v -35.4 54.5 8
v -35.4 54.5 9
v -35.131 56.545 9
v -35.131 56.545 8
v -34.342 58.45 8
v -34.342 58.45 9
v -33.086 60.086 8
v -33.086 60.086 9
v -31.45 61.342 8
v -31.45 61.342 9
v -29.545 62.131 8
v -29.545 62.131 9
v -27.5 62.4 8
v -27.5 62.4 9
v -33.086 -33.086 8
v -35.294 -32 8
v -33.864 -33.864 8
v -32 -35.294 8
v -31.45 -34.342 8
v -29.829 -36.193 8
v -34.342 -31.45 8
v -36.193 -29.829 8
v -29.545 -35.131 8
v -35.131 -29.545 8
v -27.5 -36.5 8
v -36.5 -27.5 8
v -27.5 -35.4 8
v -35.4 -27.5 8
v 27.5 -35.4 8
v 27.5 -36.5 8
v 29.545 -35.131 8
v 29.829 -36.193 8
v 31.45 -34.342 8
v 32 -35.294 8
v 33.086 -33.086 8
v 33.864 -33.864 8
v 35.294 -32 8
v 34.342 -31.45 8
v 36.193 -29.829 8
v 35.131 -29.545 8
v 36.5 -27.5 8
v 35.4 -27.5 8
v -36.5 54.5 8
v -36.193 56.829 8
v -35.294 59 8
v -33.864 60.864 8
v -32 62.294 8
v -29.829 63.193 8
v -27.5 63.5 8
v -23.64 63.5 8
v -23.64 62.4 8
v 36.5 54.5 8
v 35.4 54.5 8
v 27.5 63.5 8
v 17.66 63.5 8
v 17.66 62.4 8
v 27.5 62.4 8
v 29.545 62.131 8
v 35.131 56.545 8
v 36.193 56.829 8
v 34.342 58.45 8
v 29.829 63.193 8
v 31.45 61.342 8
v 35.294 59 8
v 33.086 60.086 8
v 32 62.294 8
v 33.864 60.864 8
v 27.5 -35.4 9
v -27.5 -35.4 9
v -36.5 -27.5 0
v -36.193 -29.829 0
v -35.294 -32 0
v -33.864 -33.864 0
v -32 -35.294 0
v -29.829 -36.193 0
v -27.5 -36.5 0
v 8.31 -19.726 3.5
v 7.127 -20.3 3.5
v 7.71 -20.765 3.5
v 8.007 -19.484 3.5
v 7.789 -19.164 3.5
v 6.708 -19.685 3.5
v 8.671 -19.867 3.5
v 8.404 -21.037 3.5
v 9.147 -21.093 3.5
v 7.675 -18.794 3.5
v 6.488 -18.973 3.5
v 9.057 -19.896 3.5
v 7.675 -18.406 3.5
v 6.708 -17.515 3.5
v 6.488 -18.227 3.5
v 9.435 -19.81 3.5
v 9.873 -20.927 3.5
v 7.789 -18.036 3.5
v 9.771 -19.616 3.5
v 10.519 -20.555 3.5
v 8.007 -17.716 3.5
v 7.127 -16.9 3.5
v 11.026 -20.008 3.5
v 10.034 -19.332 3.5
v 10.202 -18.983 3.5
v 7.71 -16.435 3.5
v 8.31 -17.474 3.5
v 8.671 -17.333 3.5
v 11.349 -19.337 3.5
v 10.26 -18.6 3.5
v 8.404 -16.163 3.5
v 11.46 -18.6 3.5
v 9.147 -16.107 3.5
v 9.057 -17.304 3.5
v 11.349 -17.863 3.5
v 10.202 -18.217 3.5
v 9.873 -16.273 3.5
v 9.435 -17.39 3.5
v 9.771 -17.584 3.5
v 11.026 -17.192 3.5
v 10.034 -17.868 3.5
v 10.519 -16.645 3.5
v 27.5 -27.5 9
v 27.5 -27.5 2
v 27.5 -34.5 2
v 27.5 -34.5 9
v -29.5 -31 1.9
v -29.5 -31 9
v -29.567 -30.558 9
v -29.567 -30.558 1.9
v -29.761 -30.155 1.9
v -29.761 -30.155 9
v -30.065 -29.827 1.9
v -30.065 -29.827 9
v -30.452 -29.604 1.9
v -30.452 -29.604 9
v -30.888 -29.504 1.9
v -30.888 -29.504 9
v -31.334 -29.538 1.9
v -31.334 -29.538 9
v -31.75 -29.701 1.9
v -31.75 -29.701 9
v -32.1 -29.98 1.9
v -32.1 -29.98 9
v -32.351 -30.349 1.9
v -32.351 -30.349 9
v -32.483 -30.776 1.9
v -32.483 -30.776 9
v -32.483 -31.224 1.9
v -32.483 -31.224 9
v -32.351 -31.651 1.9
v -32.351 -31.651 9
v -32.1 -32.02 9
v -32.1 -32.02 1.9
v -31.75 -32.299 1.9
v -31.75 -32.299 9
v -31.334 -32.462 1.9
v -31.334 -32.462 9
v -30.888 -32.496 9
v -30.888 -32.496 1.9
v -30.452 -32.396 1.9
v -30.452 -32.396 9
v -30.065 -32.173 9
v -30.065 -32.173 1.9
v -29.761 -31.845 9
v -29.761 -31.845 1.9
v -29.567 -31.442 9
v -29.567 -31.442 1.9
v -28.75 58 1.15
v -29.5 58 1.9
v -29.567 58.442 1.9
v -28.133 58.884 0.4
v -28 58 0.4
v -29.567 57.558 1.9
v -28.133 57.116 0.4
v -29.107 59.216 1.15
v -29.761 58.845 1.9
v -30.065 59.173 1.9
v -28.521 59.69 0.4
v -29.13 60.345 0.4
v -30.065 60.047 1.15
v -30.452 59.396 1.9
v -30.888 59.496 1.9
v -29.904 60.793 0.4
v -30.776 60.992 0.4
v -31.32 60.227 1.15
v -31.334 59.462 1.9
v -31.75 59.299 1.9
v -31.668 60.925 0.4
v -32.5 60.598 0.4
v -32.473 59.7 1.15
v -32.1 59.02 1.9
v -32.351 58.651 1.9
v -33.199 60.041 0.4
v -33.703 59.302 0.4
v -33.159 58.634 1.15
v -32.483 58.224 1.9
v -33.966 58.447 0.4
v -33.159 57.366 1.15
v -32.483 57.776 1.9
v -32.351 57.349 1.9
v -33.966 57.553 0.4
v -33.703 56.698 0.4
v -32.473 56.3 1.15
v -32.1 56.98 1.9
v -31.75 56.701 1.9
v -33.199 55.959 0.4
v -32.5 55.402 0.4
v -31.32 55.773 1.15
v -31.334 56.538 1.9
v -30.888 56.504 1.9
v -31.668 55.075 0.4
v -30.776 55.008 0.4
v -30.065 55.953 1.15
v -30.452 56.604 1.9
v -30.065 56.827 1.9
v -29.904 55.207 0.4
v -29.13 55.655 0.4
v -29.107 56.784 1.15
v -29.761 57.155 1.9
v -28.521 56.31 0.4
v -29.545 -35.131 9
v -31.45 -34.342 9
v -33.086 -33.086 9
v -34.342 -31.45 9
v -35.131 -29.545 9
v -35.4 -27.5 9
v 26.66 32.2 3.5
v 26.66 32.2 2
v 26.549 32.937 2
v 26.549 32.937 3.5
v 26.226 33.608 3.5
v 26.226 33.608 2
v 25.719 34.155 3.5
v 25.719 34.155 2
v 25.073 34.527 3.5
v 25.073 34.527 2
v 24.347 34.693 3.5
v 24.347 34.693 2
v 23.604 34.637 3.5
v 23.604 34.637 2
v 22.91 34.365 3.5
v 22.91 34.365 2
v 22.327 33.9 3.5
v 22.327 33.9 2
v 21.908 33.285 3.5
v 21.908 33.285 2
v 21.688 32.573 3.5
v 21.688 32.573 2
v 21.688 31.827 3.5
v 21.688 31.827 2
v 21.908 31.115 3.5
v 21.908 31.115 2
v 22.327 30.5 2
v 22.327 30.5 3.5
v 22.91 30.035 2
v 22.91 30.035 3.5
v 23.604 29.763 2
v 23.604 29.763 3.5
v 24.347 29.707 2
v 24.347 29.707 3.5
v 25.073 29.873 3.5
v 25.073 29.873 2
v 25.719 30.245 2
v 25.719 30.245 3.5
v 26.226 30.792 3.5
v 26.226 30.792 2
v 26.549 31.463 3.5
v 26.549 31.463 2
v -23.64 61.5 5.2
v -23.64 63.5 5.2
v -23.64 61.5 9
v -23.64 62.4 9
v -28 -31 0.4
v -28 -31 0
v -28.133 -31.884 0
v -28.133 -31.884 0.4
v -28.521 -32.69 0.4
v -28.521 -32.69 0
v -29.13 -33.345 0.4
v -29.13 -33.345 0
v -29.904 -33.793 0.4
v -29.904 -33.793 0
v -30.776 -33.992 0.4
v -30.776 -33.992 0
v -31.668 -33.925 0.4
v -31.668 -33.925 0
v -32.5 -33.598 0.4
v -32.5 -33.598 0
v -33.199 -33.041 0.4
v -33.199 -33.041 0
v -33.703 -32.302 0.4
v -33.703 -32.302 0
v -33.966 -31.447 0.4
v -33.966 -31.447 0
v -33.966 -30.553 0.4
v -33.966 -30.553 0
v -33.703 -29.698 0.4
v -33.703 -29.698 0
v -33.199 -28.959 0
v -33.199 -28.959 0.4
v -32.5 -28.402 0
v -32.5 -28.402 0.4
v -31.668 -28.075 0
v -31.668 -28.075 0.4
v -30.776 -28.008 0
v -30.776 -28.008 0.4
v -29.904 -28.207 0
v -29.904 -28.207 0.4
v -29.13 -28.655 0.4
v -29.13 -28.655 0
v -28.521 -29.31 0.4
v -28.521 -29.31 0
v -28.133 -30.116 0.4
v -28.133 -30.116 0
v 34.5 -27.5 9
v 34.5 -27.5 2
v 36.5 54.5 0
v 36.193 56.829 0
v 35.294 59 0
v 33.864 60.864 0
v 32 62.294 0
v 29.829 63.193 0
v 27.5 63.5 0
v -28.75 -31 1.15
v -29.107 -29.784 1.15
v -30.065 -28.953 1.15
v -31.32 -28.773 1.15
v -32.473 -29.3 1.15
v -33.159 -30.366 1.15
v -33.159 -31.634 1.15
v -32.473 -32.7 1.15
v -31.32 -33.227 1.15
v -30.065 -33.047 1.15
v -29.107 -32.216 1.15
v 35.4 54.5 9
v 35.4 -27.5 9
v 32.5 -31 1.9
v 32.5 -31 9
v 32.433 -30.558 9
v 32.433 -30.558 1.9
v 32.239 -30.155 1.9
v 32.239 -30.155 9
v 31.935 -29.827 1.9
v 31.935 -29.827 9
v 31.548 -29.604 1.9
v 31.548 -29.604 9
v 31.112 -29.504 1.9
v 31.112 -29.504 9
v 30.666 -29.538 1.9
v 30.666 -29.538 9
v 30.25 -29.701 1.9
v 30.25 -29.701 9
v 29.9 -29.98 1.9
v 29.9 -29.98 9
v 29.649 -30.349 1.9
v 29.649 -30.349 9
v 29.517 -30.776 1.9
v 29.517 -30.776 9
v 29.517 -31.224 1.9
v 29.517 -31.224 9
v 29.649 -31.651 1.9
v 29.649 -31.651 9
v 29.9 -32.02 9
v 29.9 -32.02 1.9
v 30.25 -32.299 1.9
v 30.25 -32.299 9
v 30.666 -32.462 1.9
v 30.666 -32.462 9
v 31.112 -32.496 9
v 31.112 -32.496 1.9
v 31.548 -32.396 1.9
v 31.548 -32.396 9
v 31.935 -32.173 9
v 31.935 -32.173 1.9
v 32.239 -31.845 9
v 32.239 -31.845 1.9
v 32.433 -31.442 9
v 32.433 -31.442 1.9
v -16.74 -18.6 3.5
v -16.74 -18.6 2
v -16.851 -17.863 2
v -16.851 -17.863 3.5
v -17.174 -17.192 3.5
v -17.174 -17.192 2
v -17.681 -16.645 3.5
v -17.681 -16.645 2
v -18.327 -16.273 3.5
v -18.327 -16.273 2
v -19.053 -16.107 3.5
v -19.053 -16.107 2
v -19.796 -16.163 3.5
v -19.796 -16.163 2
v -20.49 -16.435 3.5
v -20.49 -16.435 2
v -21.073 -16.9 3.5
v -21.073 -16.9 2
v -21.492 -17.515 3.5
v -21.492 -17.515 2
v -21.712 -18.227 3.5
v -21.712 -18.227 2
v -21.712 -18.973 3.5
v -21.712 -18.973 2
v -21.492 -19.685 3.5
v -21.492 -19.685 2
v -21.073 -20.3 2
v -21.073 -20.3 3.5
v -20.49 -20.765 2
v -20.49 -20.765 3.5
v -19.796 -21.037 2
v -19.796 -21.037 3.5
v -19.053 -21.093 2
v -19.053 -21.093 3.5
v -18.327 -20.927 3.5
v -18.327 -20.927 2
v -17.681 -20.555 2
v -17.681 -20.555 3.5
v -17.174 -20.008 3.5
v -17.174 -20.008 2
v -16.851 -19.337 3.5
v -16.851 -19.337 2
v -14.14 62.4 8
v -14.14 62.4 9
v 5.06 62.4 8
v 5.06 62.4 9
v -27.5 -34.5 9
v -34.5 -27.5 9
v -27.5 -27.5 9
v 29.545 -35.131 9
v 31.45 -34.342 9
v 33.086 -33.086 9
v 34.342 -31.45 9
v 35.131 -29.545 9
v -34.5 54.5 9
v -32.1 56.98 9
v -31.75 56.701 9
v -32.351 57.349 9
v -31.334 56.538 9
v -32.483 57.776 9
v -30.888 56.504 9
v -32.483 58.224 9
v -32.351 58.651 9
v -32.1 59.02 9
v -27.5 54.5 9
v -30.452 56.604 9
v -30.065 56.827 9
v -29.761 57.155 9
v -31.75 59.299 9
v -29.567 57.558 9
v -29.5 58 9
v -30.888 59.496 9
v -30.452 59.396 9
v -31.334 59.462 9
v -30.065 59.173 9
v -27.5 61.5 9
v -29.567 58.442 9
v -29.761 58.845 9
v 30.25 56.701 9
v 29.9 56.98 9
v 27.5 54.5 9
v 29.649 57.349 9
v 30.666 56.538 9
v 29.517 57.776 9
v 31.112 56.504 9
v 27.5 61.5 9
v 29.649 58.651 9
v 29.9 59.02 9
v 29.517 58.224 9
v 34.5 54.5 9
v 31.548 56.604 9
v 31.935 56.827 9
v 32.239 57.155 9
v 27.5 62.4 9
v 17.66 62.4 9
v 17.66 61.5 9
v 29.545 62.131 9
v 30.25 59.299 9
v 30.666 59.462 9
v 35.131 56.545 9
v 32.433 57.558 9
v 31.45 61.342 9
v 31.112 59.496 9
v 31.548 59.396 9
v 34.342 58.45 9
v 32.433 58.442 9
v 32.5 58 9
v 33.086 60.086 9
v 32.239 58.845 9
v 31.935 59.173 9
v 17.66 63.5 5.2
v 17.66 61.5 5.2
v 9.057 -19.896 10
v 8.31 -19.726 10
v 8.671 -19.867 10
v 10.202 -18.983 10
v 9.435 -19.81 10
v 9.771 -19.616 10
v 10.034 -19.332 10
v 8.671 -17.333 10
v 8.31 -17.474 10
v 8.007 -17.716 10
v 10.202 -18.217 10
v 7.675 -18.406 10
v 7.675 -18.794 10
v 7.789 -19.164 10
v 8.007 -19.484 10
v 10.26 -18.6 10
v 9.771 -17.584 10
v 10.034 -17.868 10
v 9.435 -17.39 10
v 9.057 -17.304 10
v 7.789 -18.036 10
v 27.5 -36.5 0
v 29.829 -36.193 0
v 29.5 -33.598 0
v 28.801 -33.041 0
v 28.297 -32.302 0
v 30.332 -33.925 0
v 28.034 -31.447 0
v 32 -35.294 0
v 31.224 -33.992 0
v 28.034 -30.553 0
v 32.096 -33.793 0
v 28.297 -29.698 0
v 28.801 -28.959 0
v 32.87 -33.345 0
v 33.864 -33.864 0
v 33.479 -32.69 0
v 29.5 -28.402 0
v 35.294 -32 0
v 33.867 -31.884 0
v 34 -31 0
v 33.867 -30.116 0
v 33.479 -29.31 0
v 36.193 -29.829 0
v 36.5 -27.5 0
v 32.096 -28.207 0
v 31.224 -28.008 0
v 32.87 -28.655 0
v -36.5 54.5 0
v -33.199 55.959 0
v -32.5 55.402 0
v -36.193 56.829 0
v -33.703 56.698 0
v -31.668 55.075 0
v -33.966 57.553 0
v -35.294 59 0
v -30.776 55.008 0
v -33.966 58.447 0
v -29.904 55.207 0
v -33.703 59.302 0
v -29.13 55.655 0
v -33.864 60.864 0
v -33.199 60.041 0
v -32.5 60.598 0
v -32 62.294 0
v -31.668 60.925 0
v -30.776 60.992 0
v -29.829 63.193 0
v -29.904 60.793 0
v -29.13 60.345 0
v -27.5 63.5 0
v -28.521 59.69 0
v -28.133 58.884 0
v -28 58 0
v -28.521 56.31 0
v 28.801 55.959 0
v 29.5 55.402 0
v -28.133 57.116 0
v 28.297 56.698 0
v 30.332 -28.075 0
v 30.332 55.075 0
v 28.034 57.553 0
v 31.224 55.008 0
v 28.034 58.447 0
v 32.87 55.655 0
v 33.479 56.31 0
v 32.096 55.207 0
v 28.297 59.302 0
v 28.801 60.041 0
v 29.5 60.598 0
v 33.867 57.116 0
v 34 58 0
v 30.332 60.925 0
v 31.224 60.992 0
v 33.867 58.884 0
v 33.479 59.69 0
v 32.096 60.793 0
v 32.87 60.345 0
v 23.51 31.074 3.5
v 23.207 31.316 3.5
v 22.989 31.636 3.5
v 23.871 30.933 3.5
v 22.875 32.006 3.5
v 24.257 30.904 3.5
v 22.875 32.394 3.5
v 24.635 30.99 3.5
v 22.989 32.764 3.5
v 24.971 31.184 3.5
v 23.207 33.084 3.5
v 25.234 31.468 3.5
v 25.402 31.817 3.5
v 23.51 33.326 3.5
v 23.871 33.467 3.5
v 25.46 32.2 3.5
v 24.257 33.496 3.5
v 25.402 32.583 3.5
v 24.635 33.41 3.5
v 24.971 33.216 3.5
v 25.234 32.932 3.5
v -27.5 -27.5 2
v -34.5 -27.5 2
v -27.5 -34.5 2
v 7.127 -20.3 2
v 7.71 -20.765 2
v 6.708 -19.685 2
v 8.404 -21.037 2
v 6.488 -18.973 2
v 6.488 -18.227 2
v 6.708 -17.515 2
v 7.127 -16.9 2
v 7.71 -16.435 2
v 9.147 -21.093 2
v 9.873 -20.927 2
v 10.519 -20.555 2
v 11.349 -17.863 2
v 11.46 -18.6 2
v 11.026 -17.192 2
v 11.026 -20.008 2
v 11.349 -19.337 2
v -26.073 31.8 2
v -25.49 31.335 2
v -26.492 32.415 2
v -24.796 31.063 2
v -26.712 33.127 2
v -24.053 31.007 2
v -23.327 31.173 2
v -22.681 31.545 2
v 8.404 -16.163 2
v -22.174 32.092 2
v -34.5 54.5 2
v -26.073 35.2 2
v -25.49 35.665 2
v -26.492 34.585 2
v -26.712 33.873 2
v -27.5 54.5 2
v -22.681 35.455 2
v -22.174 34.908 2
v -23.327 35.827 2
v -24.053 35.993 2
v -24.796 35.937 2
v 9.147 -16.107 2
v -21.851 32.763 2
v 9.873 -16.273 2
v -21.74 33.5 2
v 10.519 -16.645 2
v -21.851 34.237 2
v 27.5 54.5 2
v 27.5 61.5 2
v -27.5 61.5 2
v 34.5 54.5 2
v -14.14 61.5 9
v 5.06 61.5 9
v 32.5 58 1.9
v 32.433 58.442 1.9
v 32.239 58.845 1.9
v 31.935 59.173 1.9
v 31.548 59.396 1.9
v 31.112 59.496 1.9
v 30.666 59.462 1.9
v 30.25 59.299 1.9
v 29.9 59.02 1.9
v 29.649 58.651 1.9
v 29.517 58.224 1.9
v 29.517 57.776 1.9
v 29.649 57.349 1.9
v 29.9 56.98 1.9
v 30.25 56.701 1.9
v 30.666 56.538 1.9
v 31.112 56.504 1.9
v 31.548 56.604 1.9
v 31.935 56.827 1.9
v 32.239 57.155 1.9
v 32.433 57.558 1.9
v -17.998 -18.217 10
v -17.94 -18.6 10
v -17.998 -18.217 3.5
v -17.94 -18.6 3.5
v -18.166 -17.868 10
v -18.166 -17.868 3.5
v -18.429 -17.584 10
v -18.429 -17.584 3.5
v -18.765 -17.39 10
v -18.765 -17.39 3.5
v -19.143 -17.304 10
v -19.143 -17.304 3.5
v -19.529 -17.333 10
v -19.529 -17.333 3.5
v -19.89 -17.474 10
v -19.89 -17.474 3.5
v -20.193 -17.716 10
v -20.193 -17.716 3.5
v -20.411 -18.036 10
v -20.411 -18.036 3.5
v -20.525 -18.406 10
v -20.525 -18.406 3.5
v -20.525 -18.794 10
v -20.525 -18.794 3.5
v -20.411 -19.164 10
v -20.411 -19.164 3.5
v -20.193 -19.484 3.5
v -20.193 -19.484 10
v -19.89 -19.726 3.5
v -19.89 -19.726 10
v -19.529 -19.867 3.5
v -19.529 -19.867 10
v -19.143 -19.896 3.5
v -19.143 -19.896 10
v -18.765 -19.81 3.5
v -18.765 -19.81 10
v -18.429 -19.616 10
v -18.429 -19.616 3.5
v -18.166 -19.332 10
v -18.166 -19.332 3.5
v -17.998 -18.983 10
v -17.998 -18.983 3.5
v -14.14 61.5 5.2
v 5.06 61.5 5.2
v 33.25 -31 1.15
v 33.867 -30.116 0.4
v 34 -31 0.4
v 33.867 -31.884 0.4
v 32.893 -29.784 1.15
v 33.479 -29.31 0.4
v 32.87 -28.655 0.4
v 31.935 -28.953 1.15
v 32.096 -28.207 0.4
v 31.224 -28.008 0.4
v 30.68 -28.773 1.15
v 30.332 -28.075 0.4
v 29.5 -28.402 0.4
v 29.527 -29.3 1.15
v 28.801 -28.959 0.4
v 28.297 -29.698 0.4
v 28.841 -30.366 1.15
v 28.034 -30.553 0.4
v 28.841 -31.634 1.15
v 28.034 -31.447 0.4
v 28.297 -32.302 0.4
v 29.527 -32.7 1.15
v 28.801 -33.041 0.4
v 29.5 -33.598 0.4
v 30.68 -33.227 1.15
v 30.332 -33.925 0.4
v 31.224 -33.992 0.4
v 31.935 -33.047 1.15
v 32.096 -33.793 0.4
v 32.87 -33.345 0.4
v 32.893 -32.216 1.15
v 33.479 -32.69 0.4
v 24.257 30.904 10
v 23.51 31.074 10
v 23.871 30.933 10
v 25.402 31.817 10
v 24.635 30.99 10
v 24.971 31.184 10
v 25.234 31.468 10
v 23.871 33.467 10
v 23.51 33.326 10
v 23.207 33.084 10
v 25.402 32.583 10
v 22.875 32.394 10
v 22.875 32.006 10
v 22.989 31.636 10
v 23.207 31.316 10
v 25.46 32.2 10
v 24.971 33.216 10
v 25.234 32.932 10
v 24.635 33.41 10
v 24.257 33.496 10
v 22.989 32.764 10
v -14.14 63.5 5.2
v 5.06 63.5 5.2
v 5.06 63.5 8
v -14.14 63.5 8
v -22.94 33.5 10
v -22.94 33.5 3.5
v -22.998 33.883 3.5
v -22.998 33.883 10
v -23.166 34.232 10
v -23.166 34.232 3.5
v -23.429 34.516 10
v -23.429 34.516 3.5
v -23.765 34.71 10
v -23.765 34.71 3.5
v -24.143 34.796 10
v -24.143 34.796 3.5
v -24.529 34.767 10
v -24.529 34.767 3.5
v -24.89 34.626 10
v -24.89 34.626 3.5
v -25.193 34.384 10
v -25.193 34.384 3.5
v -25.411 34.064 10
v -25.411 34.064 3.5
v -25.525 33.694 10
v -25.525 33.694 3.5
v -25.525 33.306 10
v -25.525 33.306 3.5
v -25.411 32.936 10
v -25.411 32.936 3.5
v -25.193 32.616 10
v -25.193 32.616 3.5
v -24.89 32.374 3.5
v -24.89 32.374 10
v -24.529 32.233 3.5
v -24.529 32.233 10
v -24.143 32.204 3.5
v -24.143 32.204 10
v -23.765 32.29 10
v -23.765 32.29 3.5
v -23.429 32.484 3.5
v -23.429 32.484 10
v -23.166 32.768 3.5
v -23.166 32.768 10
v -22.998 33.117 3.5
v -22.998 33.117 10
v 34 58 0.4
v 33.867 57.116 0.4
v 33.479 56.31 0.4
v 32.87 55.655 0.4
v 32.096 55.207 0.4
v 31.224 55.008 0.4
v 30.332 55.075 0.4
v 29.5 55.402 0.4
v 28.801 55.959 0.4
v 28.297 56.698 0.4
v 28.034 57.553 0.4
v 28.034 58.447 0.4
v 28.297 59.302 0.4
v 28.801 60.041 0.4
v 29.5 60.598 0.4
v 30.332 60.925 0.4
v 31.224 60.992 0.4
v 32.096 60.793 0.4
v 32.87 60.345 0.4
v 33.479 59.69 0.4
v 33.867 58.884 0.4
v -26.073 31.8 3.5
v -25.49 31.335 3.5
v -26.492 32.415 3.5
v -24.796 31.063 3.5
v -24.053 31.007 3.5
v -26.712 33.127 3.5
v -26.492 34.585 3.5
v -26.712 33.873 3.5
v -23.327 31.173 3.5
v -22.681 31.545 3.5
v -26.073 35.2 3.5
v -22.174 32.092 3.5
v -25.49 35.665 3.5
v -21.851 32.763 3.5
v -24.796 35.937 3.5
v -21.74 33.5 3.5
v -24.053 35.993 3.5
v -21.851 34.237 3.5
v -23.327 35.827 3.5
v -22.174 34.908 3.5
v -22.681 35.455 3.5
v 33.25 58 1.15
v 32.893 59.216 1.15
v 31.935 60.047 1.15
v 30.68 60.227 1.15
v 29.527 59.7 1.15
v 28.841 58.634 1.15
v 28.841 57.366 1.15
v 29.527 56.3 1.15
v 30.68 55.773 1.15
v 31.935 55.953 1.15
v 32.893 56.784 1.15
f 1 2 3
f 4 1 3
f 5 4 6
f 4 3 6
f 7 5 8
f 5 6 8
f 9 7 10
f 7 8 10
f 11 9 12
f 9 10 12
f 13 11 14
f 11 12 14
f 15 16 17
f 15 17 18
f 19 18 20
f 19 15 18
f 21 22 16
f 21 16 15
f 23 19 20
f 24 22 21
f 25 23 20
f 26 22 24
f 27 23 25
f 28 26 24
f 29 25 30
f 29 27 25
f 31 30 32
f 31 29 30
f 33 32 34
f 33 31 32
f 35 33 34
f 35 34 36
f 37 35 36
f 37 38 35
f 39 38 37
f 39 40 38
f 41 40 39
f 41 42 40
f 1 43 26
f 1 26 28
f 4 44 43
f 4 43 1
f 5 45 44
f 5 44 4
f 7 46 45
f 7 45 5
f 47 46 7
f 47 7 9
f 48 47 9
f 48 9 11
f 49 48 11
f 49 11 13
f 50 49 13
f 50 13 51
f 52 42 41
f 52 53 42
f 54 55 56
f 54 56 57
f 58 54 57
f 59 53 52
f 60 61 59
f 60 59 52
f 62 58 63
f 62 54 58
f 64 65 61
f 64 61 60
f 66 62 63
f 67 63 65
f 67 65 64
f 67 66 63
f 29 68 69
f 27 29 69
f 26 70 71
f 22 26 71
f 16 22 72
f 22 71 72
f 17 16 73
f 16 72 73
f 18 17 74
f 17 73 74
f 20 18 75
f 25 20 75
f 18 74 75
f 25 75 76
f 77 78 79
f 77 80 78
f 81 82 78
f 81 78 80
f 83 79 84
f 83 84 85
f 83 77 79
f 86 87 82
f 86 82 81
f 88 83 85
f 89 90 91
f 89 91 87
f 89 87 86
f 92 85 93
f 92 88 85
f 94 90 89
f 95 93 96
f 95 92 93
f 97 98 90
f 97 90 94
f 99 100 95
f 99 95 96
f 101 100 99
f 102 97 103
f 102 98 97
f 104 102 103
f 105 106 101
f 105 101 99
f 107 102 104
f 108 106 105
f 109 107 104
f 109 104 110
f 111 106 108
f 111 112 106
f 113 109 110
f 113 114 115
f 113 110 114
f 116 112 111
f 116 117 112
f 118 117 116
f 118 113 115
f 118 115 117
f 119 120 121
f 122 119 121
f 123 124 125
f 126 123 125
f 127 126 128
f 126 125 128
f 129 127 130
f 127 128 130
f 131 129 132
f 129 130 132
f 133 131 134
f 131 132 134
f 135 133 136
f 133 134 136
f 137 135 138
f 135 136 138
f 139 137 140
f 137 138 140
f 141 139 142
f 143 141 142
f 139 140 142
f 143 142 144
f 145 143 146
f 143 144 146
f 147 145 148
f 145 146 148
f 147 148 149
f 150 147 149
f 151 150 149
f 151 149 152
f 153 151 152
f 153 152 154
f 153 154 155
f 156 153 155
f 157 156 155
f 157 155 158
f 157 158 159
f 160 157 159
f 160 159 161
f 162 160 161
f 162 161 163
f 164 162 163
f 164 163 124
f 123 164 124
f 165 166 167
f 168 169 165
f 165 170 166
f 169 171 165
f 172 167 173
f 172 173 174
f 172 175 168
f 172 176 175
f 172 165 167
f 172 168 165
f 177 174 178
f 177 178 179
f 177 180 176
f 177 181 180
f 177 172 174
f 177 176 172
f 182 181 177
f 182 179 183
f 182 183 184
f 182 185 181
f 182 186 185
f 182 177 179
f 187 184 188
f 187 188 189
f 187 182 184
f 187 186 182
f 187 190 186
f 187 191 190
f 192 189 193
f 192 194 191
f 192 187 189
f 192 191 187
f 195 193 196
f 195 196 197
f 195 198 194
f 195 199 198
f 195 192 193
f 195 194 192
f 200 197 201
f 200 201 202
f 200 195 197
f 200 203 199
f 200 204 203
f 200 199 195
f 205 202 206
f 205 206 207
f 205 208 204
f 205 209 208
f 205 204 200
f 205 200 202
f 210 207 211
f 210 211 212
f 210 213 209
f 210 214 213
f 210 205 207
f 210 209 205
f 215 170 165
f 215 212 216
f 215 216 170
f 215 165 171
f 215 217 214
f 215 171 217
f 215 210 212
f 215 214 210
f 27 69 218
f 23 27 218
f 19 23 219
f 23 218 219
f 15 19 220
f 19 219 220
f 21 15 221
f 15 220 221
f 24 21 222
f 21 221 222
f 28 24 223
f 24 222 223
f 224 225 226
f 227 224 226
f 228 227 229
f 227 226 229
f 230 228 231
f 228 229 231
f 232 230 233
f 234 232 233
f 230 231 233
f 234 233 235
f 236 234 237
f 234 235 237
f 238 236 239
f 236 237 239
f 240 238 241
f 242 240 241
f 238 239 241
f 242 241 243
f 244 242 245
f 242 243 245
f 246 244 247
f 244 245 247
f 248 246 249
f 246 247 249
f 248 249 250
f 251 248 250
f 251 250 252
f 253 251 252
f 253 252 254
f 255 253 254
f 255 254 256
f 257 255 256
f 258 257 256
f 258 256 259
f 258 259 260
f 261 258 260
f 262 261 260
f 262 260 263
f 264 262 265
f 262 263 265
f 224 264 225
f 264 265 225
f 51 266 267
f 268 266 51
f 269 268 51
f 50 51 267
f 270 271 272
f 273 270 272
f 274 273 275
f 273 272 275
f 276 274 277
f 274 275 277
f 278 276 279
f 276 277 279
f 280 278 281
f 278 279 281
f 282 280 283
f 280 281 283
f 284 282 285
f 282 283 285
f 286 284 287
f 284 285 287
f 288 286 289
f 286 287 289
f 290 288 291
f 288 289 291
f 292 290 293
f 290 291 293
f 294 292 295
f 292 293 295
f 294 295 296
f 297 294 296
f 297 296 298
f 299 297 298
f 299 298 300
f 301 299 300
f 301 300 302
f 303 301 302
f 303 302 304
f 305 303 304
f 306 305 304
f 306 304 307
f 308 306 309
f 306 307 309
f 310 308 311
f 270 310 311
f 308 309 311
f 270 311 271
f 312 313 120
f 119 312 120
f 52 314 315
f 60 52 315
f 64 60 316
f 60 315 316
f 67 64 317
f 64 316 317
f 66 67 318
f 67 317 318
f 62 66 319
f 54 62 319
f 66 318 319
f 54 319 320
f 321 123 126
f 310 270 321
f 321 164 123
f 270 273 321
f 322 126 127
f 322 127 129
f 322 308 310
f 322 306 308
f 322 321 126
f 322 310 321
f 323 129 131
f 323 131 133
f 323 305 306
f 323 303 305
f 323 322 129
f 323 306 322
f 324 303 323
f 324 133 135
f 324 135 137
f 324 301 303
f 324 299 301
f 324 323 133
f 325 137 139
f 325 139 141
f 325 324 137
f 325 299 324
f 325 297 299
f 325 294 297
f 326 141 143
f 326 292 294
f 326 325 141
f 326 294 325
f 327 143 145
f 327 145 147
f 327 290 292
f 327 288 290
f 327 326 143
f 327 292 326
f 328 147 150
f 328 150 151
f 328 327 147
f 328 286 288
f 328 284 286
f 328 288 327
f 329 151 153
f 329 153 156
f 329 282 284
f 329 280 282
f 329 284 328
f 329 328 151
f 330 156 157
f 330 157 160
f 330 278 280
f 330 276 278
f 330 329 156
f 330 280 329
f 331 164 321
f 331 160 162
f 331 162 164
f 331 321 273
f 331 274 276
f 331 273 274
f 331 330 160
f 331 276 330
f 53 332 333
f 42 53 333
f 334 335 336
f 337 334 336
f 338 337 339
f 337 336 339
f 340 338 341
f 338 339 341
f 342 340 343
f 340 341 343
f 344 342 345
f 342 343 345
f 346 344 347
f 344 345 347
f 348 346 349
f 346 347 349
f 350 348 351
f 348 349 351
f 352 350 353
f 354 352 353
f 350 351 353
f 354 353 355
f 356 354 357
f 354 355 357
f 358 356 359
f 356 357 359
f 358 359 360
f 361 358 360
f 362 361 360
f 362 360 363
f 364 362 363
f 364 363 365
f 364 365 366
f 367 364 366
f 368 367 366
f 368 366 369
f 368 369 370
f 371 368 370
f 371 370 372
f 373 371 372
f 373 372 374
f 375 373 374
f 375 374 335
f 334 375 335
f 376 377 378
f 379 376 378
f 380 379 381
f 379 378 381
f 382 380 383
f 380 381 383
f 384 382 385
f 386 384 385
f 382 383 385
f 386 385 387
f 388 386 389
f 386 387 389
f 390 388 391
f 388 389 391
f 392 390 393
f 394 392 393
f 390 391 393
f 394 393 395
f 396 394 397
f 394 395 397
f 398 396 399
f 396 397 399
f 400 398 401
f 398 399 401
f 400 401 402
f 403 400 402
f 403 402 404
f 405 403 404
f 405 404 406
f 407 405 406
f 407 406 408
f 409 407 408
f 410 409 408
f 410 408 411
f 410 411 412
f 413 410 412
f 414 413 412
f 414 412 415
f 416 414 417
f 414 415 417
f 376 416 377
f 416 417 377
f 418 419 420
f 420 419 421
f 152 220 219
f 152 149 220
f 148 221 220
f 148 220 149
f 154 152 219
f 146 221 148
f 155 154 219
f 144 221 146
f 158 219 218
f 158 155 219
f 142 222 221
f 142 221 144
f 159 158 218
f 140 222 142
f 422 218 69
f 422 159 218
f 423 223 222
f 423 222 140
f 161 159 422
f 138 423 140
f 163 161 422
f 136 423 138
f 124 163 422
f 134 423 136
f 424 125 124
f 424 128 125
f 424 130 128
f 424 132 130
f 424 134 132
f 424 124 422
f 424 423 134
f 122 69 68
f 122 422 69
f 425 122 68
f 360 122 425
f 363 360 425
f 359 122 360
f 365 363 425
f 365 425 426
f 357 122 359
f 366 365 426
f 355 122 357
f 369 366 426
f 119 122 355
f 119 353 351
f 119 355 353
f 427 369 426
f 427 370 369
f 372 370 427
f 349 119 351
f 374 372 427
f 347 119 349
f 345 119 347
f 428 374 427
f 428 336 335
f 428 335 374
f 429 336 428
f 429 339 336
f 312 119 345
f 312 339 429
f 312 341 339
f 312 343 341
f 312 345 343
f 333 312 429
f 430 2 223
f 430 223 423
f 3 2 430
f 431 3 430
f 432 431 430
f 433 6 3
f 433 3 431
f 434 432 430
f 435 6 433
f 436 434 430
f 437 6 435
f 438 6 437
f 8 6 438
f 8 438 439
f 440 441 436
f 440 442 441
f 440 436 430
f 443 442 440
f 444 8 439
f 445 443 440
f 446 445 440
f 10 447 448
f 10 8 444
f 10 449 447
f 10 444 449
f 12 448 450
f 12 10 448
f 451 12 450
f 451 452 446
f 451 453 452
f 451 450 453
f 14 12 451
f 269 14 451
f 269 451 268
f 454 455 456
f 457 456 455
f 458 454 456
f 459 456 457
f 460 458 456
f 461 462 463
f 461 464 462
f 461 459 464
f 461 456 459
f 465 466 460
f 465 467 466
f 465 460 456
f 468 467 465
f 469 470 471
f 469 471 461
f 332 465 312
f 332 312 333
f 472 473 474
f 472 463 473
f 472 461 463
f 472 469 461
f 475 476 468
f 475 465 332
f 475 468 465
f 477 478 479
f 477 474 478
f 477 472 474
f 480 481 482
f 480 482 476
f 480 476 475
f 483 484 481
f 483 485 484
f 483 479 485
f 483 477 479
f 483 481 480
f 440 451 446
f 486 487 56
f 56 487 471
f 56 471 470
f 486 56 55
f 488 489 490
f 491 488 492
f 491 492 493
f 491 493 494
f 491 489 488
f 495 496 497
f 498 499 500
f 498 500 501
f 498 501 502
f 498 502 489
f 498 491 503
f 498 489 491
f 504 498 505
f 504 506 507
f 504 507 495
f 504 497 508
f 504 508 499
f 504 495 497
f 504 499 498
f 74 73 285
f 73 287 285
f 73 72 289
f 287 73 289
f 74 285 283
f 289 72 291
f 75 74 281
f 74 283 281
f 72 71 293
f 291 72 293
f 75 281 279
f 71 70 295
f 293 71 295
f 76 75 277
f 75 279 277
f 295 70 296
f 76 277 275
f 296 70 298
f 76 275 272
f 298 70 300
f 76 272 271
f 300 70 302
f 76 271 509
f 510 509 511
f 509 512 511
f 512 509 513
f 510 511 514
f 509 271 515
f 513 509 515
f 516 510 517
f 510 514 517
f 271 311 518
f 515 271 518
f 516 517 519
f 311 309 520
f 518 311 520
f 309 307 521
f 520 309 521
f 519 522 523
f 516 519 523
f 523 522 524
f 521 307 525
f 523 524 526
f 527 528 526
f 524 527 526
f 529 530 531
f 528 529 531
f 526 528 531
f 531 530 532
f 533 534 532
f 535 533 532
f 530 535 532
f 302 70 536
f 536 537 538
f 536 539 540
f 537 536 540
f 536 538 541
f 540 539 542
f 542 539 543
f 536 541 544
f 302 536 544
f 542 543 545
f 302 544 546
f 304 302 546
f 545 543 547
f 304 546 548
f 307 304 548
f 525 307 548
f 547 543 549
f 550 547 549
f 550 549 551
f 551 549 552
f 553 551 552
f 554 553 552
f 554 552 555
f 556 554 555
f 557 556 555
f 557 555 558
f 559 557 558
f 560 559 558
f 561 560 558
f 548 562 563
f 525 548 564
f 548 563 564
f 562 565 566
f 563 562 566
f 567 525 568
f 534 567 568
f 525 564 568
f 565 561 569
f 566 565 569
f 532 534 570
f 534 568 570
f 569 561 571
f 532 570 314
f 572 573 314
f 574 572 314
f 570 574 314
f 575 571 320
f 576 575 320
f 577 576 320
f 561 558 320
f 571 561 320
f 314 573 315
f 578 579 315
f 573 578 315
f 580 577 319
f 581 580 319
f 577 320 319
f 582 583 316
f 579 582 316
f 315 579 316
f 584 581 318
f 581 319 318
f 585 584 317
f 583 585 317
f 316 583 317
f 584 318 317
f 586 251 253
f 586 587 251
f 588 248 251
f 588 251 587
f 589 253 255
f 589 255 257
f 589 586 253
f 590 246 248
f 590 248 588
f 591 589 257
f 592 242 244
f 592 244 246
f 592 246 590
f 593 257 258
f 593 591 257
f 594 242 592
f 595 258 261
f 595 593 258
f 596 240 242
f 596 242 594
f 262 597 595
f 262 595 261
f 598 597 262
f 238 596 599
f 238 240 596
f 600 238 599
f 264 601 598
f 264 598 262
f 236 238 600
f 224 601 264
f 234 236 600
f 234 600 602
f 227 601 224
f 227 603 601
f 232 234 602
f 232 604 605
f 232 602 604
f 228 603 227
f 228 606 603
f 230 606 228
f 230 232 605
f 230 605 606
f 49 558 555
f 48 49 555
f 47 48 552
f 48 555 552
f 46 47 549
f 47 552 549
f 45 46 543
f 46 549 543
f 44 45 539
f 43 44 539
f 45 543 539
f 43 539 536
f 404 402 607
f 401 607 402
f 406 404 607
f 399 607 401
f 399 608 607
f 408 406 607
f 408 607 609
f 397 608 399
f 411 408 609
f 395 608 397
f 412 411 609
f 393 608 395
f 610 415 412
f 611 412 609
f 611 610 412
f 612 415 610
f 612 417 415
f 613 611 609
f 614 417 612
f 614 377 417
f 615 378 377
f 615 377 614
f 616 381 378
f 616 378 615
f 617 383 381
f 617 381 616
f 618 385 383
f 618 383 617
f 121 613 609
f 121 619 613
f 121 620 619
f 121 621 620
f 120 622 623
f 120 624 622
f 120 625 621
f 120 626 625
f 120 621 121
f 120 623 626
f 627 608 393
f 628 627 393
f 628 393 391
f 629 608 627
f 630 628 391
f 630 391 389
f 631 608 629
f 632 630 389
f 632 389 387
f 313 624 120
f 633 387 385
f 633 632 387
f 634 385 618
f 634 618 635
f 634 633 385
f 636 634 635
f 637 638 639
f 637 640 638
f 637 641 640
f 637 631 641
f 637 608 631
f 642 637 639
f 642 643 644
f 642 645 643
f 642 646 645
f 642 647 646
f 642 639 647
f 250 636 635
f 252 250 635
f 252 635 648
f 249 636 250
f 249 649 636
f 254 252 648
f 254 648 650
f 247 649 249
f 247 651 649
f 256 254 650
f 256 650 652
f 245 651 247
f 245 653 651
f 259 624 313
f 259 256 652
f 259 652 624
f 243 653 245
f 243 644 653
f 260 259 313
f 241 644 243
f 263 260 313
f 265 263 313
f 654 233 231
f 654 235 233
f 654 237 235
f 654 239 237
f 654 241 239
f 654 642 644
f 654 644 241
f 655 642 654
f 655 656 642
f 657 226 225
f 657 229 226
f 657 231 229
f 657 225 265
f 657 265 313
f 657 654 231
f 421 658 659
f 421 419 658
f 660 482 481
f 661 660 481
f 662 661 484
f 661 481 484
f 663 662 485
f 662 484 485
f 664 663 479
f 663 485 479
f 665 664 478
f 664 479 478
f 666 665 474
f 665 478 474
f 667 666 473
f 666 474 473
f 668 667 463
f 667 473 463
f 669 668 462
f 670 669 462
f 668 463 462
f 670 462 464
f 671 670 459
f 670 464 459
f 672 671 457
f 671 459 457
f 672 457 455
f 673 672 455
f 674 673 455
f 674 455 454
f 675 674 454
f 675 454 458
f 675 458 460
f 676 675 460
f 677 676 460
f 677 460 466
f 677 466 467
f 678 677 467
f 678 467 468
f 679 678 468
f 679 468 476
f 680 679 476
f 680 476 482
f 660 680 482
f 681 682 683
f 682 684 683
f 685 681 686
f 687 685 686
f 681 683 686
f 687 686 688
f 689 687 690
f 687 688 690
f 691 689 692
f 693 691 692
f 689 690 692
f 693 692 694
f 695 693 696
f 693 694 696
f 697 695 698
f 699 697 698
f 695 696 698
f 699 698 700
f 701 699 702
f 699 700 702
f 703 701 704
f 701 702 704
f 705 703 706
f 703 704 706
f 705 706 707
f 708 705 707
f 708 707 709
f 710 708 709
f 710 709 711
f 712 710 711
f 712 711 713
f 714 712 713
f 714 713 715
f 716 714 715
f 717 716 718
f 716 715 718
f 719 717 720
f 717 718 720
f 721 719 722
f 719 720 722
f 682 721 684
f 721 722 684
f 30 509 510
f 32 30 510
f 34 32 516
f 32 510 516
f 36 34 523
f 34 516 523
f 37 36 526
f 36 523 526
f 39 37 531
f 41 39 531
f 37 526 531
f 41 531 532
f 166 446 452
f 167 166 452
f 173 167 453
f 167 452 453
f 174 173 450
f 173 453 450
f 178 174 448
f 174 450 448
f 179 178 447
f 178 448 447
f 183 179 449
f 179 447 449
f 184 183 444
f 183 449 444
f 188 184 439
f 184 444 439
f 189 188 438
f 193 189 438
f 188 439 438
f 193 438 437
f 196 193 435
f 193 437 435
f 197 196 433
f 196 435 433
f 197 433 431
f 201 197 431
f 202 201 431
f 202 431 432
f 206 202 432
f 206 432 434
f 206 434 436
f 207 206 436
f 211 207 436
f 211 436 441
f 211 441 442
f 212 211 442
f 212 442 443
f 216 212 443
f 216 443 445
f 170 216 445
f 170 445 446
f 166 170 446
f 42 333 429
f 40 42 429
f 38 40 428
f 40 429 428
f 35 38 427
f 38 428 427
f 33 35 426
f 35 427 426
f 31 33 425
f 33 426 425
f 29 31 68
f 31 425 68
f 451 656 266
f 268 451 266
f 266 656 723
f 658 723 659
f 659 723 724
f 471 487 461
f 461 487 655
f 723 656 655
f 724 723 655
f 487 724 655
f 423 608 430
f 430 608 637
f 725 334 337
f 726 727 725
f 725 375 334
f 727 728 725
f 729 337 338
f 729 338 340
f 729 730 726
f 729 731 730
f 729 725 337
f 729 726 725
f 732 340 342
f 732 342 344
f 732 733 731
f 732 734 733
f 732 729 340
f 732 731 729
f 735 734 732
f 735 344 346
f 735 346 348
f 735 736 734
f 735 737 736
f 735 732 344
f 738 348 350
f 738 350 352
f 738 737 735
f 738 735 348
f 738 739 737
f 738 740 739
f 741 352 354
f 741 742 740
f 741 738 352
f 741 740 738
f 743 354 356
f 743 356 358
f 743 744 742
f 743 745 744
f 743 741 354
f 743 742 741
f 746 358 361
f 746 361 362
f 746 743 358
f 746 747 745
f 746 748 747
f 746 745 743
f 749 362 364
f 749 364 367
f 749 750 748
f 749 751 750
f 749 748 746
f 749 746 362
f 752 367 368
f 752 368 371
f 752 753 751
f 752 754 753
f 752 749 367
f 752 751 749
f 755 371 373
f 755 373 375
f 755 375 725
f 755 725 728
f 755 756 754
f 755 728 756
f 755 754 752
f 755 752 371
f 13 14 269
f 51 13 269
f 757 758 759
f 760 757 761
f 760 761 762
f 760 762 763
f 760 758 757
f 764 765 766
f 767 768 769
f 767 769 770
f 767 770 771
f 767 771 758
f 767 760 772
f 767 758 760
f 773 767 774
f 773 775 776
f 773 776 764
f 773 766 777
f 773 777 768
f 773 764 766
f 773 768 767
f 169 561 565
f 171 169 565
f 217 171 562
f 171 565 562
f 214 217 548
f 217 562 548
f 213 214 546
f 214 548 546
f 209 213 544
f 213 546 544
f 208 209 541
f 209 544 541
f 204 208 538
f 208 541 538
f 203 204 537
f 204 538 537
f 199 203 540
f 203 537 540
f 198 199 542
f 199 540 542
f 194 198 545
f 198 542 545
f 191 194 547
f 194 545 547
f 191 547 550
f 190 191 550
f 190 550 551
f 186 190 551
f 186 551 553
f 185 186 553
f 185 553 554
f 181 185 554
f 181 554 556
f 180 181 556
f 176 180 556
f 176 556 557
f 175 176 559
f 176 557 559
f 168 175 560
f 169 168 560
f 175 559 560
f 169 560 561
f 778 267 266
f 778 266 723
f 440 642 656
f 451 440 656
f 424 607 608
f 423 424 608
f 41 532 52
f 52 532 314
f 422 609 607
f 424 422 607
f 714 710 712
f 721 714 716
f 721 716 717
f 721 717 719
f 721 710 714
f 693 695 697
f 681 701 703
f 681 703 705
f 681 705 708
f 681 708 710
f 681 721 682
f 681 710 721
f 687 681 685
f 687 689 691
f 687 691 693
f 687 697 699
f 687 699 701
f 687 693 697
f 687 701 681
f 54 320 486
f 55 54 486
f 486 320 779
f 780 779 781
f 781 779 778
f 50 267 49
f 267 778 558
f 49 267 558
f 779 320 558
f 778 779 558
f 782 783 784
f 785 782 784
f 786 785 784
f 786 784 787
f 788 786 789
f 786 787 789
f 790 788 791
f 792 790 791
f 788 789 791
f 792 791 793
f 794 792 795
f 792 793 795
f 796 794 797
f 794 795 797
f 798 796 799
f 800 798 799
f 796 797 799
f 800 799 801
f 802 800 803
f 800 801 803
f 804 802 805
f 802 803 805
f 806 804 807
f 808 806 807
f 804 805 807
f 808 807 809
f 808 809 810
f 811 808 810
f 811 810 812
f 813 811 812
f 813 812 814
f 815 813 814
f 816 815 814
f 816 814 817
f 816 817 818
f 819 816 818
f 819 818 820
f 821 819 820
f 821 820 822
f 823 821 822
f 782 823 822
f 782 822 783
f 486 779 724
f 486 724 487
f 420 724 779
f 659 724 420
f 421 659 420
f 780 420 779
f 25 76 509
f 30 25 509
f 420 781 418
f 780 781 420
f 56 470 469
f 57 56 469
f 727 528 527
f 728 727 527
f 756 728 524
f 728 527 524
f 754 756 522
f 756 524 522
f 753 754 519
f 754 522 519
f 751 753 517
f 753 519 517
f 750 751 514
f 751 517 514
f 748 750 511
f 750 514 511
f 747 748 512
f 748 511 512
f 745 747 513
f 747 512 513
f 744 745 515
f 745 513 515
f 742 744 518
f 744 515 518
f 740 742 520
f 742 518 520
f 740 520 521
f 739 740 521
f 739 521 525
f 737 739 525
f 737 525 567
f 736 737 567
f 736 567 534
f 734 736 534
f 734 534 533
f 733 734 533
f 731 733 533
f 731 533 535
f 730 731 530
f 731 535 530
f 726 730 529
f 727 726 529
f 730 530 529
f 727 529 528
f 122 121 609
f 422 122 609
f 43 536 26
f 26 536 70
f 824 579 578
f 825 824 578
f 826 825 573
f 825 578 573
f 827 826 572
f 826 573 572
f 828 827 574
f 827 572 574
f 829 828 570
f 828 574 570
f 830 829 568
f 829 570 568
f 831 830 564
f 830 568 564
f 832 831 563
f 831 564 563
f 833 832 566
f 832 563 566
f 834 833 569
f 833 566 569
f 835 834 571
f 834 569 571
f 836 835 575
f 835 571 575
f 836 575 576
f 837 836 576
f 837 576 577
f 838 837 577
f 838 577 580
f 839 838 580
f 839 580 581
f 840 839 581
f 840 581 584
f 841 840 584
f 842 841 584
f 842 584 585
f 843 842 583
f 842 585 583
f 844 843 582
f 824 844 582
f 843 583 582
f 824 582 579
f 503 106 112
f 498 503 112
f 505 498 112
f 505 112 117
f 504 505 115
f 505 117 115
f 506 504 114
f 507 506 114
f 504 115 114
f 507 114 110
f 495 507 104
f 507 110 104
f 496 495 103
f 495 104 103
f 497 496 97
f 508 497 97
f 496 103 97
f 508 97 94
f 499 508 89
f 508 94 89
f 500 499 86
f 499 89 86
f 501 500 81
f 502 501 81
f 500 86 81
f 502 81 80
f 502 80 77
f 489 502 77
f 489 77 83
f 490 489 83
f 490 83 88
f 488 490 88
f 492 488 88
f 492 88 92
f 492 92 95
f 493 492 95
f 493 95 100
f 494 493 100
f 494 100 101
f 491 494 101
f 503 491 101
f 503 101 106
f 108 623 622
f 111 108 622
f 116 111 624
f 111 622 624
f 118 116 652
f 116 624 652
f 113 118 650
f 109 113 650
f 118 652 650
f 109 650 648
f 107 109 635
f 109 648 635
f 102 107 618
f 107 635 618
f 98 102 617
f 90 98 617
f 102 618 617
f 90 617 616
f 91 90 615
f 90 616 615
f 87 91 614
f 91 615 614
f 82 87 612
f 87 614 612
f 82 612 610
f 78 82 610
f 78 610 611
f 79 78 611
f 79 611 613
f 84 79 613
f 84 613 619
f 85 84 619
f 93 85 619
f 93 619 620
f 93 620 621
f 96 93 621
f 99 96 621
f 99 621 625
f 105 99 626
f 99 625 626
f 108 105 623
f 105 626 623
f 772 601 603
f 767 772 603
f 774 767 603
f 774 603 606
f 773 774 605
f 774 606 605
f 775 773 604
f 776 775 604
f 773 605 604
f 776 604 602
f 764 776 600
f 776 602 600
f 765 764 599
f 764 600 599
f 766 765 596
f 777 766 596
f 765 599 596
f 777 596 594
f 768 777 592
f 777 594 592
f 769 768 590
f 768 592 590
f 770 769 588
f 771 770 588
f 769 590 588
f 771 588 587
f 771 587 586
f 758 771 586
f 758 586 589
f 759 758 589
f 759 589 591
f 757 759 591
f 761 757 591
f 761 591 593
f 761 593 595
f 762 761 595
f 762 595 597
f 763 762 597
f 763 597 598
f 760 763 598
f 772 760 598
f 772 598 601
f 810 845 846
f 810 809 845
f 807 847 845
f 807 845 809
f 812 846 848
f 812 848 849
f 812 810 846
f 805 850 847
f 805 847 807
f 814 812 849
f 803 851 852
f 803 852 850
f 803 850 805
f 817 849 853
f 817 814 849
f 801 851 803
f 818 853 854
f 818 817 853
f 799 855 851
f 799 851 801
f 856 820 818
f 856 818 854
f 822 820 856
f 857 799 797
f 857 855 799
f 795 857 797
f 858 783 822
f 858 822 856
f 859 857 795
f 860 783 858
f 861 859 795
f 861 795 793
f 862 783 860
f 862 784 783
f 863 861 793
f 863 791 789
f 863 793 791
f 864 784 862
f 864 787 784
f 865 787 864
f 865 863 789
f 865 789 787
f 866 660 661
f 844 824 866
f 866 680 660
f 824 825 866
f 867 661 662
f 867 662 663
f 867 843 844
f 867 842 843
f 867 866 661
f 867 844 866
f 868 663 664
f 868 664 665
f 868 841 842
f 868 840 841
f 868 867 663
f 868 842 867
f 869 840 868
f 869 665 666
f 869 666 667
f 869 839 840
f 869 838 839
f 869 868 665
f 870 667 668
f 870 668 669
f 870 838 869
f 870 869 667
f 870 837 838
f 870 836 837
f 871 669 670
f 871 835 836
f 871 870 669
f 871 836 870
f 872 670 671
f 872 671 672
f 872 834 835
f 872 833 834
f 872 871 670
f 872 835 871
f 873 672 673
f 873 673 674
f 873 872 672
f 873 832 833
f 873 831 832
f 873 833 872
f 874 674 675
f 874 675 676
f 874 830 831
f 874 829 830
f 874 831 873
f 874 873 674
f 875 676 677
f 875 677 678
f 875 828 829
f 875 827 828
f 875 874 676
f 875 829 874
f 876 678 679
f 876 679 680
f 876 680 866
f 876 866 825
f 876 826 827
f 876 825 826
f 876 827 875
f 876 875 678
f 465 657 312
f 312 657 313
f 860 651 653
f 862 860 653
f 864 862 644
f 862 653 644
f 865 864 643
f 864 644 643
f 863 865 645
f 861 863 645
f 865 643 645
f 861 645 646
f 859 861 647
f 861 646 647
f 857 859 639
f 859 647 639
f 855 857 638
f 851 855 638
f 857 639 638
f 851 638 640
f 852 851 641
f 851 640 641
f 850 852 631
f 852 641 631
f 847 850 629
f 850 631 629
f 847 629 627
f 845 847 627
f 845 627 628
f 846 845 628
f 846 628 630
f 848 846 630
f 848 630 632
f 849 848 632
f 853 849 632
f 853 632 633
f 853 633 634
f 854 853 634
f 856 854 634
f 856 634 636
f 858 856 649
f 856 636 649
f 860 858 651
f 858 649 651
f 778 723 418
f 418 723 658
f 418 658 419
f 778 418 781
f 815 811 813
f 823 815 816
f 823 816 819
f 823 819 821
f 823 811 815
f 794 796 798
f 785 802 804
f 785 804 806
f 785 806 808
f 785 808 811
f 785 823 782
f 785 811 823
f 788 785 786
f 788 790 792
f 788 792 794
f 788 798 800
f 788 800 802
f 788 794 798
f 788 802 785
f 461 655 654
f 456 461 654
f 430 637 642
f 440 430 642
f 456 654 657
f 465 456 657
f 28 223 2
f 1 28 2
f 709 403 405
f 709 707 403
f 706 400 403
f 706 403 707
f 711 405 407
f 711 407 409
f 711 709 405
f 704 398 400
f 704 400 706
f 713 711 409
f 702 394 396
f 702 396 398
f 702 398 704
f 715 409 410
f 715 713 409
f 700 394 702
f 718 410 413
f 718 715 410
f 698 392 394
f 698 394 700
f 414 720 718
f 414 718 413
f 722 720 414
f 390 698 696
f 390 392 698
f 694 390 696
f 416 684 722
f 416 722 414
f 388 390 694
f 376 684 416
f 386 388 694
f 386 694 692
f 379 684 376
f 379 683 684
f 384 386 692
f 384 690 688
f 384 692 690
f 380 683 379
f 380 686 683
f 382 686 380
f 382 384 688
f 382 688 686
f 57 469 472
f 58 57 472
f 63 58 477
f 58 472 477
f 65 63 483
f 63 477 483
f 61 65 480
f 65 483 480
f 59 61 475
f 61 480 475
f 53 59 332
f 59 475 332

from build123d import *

# Parameters (mm, degrees)
F1_DEPTH  = 2
F2_R      = 2.5
F3_DEPTH  = 1.5
F4_R      = 1.3
F5_DEPTH  = 1.5
F7_DEPTH  = 7
F8_R      = 1.5
F9_DEPTH  = 10
F10_W     = 12.6
F10_H     = 2
F10_W_2   = 9.5
F11_DEPTH = 3.8
F12_R     = 3
F13_DEPTH = 0.4
F14_SIZE  = 1.49999
F15_W     = 19.2
F15_H     = 1.1
F16_DEPTH = 1
F17_DEPTH = 5


# Not quite as in the source:
# - a fillet or chamfer is up to 0.001 mm smaller than in the source, because OpenCascade refuses the exact size


with BuildPart() as f1:
    # F0 (on Top) → F1 (new body)
    with BuildSketch(Plane.XY):
        with BuildLine():
            Line((27.5, 63.5), (-27.5, 63.5))
            ThreePointArc((-27.5, 63.5), (-33.8639610307, 60.8639610307), (-36.5, 54.5))
            Line((-36.5, 54.5), (-36.5, -27.5))
            ThreePointArc((-36.5, -27.5), (-33.8639610307, -33.8639610307), (-27.5, -36.5))
            Line((-27.5, -36.5), (27.5, -36.5))
            ThreePointArc((27.5, -36.5), (33.8639610307, -33.8639610307), (36.5, -27.5))
            Line((36.5, -27.5), (36.5, 54.5))
            ThreePointArc((36.5, 54.5), (33.8639610307, 60.8639610307), (27.5, 63.5))
        make_face()
    extrude(amount=F1_DEPTH)

    # F2 (on face) → F3 (join)
    with BuildSketch(Plane.XY.offset(2)):
        with Locations((-19.24, -18.6)):
            Circle(F2_R)
        with Locations((8.96, -18.6)):
            Circle(F2_R)
        with Locations((24.16, 32.2)):
            Circle(F2_R)
        with Locations((-24.24, 33.5)):
            Circle(F2_R)
    extrude(amount=F3_DEPTH)

    # F4 (on face) → F5 (join)
    with BuildSketch(Plane.XY.offset(3.5)):
        with Locations((-19.24, -18.6)):
            Circle(F4_R)
        with Locations((8.96, -18.6)):
            Circle(F4_R)
        with Locations((24.16, 32.2)):
            Circle(F4_R)
        with Locations((-24.24, 33.5)):
            Circle(F4_R)
    extrude(amount=F5_DEPTH)

    # F6 (on face) → F7 (join)
    with BuildSketch(Plane.XY.offset(2)):
        with BuildLine():
            Line((27.5, 63.5), (-27.5, 63.5))
            ThreePointArc((-27.5, 63.5), (-33.8639610307, 60.8639610307), (-36.5, 54.5))
            Line((-36.5, 54.5), (-36.5, -27.5))
            ThreePointArc((-36.5, -27.5), (-33.8639610307, -33.8639610307), (-27.5, -36.5))
            Line((-27.5, -36.5), (27.5, -36.5))
            ThreePointArc((27.5, -36.5), (33.8639610307, -33.8639610307), (36.5, -27.5))
            Line((36.5, -27.5), (36.5, 54.5))
            ThreePointArc((36.5, 54.5), (33.8639610307, 60.8639610307), (27.5, 63.5))
        make_face()
        Polygon((-27.5, 54.5), (-27.5, 61.5), (27.5, 61.5), (27.5, 54.5), (34.5, 54.5), (34.5, -27.5), (27.5, -27.5), (27.5, -34.5), (-27.5, -34.5), (-27.5, -27.5), (-34.5, -27.5), (-34.5, 54.5), align=None, mode=Mode.SUBTRACT)
    extrude(amount=F7_DEPTH)

    # F8 (on face) → F9 (cut)
    with BuildSketch(Plane.XY.offset(9)):
        with Locations((-31, 58)):
            Circle(F8_R)
        with Locations((31, 58)):
            Circle(F8_R)
        with Locations((-31, -31)):
            Circle(F8_R)
        with Locations((31, -31)):
            Circle(F8_R)
    extrude(amount=-F9_DEPTH, mode=Mode.SUBTRACT)

    # F10 (on face) → F11 (cut)
    with BuildSketch(Plane.XY.offset(9)):
        with Locations((11.36, 62.5)):
            Rectangle(F10_W, F10_H)
        with Locations((-18.89, 62.5)):
            Rectangle(F10_W_2, F10_H)
    extrude(amount=-F11_DEPTH, mode=Mode.SUBTRACT)

    # F12 (on face) → F13 (cut)
    with BuildSketch(Plane(origin=(0, 0, 0), x_dir=(1, 0, 0), z_dir=(0, 0, -1))):
        with Locations((31, -58)):
            Circle(F12_R)
        with Locations((-31, -58)):
            Circle(F12_R)
        with Locations((-31, 31)):
            Circle(F12_R)
        with Locations((31, 31)):
            Circle(F12_R)
    extrude(amount=-F13_DEPTH, mode=Mode.SUBTRACT)

    # F14 (size 1.5 in the source; OpenCascade refuses exactly that, so slightly less here)
    f14_edges = [f1.edges().sort_by_distance(p)[0] for p in [
        (29.5, 58, 0.4),
        (-32.5, 58, 0.4),
        (29.5, -31, 0.4),
        (-32.5, -31, 0.4),
    ]]
    chamfer(f14_edges, length=F14_SIZE)

    # F15 (on face) → F16 (cut)
    with BuildSketch(Plane.XY.offset(9)):
        with BuildLine():
            Line((-23.64, 63.5), (-27.5, 63.5))
            ThreePointArc((-27.5, 63.5), (-33.8639610307, 60.8639610307), (-36.5, 54.5))
            Line((-36.5, 54.5), (-36.5, -27.5))
            ThreePointArc((-36.5, -27.5), (-33.8639610307, -33.8639610307), (-27.5, -36.5))
            Line((-27.5, -36.5), (27.5, -36.5))
            ThreePointArc((27.5, -36.5), (33.8639610307, -33.8639610307), (36.5, -27.5))
            Line((36.5, -27.5), (36.5, 54.5))
            ThreePointArc((36.5, 54.5), (33.8639610307, 60.8639610307), (27.5, 63.5))
            Line((27.5, 63.5), (17.66, 63.5))
            Line((17.66, 63.5), (17.66, 62.4))
            Line((17.66, 62.4), (27.5, 62.4))
            ThreePointArc((27.5, 62.4), (33.0861435714, 60.0861435714), (35.4, 54.5))
            Line((35.4, 54.5), (35.4, -27.5))
            ThreePointArc((35.4, -27.5), (33.0861435714, -33.0861435714), (27.5, -35.4))
            Line((27.5, -35.4), (-27.5, -35.4))
            ThreePointArc((-27.5, -35.4), (-33.0861435714, -33.0861435714), (-35.4, -27.5))
            Line((-35.4, -27.5), (-35.4, 54.5))
            ThreePointArc((-35.4, 54.5), (-33.0861435714, 60.0861435714), (-27.5, 62.4))
            Line((-27.5, 62.4), (-23.64, 62.4))
            Line((-23.64, 62.4), (-23.64, 63.5))
        make_face()
        with Locations((-4.54, 62.95)):
            Rectangle(F15_W, F15_H)
    extrude(amount=-F16_DEPTH, mode=Mode.SUBTRACT)

    # F17 (add): faces of the model
    f17_faces = [f1.faces().sort_by_distance(p)[0] for p in [
        (-19.24, -18.6, 5),
        (8.96, -18.6, 5),
        (24.16, 32.2, 5),
        (-24.24, 33.5, 5),
    ]]
    extrude(f17_faces, amount=F17_DEPTH)


solid = f1.part
